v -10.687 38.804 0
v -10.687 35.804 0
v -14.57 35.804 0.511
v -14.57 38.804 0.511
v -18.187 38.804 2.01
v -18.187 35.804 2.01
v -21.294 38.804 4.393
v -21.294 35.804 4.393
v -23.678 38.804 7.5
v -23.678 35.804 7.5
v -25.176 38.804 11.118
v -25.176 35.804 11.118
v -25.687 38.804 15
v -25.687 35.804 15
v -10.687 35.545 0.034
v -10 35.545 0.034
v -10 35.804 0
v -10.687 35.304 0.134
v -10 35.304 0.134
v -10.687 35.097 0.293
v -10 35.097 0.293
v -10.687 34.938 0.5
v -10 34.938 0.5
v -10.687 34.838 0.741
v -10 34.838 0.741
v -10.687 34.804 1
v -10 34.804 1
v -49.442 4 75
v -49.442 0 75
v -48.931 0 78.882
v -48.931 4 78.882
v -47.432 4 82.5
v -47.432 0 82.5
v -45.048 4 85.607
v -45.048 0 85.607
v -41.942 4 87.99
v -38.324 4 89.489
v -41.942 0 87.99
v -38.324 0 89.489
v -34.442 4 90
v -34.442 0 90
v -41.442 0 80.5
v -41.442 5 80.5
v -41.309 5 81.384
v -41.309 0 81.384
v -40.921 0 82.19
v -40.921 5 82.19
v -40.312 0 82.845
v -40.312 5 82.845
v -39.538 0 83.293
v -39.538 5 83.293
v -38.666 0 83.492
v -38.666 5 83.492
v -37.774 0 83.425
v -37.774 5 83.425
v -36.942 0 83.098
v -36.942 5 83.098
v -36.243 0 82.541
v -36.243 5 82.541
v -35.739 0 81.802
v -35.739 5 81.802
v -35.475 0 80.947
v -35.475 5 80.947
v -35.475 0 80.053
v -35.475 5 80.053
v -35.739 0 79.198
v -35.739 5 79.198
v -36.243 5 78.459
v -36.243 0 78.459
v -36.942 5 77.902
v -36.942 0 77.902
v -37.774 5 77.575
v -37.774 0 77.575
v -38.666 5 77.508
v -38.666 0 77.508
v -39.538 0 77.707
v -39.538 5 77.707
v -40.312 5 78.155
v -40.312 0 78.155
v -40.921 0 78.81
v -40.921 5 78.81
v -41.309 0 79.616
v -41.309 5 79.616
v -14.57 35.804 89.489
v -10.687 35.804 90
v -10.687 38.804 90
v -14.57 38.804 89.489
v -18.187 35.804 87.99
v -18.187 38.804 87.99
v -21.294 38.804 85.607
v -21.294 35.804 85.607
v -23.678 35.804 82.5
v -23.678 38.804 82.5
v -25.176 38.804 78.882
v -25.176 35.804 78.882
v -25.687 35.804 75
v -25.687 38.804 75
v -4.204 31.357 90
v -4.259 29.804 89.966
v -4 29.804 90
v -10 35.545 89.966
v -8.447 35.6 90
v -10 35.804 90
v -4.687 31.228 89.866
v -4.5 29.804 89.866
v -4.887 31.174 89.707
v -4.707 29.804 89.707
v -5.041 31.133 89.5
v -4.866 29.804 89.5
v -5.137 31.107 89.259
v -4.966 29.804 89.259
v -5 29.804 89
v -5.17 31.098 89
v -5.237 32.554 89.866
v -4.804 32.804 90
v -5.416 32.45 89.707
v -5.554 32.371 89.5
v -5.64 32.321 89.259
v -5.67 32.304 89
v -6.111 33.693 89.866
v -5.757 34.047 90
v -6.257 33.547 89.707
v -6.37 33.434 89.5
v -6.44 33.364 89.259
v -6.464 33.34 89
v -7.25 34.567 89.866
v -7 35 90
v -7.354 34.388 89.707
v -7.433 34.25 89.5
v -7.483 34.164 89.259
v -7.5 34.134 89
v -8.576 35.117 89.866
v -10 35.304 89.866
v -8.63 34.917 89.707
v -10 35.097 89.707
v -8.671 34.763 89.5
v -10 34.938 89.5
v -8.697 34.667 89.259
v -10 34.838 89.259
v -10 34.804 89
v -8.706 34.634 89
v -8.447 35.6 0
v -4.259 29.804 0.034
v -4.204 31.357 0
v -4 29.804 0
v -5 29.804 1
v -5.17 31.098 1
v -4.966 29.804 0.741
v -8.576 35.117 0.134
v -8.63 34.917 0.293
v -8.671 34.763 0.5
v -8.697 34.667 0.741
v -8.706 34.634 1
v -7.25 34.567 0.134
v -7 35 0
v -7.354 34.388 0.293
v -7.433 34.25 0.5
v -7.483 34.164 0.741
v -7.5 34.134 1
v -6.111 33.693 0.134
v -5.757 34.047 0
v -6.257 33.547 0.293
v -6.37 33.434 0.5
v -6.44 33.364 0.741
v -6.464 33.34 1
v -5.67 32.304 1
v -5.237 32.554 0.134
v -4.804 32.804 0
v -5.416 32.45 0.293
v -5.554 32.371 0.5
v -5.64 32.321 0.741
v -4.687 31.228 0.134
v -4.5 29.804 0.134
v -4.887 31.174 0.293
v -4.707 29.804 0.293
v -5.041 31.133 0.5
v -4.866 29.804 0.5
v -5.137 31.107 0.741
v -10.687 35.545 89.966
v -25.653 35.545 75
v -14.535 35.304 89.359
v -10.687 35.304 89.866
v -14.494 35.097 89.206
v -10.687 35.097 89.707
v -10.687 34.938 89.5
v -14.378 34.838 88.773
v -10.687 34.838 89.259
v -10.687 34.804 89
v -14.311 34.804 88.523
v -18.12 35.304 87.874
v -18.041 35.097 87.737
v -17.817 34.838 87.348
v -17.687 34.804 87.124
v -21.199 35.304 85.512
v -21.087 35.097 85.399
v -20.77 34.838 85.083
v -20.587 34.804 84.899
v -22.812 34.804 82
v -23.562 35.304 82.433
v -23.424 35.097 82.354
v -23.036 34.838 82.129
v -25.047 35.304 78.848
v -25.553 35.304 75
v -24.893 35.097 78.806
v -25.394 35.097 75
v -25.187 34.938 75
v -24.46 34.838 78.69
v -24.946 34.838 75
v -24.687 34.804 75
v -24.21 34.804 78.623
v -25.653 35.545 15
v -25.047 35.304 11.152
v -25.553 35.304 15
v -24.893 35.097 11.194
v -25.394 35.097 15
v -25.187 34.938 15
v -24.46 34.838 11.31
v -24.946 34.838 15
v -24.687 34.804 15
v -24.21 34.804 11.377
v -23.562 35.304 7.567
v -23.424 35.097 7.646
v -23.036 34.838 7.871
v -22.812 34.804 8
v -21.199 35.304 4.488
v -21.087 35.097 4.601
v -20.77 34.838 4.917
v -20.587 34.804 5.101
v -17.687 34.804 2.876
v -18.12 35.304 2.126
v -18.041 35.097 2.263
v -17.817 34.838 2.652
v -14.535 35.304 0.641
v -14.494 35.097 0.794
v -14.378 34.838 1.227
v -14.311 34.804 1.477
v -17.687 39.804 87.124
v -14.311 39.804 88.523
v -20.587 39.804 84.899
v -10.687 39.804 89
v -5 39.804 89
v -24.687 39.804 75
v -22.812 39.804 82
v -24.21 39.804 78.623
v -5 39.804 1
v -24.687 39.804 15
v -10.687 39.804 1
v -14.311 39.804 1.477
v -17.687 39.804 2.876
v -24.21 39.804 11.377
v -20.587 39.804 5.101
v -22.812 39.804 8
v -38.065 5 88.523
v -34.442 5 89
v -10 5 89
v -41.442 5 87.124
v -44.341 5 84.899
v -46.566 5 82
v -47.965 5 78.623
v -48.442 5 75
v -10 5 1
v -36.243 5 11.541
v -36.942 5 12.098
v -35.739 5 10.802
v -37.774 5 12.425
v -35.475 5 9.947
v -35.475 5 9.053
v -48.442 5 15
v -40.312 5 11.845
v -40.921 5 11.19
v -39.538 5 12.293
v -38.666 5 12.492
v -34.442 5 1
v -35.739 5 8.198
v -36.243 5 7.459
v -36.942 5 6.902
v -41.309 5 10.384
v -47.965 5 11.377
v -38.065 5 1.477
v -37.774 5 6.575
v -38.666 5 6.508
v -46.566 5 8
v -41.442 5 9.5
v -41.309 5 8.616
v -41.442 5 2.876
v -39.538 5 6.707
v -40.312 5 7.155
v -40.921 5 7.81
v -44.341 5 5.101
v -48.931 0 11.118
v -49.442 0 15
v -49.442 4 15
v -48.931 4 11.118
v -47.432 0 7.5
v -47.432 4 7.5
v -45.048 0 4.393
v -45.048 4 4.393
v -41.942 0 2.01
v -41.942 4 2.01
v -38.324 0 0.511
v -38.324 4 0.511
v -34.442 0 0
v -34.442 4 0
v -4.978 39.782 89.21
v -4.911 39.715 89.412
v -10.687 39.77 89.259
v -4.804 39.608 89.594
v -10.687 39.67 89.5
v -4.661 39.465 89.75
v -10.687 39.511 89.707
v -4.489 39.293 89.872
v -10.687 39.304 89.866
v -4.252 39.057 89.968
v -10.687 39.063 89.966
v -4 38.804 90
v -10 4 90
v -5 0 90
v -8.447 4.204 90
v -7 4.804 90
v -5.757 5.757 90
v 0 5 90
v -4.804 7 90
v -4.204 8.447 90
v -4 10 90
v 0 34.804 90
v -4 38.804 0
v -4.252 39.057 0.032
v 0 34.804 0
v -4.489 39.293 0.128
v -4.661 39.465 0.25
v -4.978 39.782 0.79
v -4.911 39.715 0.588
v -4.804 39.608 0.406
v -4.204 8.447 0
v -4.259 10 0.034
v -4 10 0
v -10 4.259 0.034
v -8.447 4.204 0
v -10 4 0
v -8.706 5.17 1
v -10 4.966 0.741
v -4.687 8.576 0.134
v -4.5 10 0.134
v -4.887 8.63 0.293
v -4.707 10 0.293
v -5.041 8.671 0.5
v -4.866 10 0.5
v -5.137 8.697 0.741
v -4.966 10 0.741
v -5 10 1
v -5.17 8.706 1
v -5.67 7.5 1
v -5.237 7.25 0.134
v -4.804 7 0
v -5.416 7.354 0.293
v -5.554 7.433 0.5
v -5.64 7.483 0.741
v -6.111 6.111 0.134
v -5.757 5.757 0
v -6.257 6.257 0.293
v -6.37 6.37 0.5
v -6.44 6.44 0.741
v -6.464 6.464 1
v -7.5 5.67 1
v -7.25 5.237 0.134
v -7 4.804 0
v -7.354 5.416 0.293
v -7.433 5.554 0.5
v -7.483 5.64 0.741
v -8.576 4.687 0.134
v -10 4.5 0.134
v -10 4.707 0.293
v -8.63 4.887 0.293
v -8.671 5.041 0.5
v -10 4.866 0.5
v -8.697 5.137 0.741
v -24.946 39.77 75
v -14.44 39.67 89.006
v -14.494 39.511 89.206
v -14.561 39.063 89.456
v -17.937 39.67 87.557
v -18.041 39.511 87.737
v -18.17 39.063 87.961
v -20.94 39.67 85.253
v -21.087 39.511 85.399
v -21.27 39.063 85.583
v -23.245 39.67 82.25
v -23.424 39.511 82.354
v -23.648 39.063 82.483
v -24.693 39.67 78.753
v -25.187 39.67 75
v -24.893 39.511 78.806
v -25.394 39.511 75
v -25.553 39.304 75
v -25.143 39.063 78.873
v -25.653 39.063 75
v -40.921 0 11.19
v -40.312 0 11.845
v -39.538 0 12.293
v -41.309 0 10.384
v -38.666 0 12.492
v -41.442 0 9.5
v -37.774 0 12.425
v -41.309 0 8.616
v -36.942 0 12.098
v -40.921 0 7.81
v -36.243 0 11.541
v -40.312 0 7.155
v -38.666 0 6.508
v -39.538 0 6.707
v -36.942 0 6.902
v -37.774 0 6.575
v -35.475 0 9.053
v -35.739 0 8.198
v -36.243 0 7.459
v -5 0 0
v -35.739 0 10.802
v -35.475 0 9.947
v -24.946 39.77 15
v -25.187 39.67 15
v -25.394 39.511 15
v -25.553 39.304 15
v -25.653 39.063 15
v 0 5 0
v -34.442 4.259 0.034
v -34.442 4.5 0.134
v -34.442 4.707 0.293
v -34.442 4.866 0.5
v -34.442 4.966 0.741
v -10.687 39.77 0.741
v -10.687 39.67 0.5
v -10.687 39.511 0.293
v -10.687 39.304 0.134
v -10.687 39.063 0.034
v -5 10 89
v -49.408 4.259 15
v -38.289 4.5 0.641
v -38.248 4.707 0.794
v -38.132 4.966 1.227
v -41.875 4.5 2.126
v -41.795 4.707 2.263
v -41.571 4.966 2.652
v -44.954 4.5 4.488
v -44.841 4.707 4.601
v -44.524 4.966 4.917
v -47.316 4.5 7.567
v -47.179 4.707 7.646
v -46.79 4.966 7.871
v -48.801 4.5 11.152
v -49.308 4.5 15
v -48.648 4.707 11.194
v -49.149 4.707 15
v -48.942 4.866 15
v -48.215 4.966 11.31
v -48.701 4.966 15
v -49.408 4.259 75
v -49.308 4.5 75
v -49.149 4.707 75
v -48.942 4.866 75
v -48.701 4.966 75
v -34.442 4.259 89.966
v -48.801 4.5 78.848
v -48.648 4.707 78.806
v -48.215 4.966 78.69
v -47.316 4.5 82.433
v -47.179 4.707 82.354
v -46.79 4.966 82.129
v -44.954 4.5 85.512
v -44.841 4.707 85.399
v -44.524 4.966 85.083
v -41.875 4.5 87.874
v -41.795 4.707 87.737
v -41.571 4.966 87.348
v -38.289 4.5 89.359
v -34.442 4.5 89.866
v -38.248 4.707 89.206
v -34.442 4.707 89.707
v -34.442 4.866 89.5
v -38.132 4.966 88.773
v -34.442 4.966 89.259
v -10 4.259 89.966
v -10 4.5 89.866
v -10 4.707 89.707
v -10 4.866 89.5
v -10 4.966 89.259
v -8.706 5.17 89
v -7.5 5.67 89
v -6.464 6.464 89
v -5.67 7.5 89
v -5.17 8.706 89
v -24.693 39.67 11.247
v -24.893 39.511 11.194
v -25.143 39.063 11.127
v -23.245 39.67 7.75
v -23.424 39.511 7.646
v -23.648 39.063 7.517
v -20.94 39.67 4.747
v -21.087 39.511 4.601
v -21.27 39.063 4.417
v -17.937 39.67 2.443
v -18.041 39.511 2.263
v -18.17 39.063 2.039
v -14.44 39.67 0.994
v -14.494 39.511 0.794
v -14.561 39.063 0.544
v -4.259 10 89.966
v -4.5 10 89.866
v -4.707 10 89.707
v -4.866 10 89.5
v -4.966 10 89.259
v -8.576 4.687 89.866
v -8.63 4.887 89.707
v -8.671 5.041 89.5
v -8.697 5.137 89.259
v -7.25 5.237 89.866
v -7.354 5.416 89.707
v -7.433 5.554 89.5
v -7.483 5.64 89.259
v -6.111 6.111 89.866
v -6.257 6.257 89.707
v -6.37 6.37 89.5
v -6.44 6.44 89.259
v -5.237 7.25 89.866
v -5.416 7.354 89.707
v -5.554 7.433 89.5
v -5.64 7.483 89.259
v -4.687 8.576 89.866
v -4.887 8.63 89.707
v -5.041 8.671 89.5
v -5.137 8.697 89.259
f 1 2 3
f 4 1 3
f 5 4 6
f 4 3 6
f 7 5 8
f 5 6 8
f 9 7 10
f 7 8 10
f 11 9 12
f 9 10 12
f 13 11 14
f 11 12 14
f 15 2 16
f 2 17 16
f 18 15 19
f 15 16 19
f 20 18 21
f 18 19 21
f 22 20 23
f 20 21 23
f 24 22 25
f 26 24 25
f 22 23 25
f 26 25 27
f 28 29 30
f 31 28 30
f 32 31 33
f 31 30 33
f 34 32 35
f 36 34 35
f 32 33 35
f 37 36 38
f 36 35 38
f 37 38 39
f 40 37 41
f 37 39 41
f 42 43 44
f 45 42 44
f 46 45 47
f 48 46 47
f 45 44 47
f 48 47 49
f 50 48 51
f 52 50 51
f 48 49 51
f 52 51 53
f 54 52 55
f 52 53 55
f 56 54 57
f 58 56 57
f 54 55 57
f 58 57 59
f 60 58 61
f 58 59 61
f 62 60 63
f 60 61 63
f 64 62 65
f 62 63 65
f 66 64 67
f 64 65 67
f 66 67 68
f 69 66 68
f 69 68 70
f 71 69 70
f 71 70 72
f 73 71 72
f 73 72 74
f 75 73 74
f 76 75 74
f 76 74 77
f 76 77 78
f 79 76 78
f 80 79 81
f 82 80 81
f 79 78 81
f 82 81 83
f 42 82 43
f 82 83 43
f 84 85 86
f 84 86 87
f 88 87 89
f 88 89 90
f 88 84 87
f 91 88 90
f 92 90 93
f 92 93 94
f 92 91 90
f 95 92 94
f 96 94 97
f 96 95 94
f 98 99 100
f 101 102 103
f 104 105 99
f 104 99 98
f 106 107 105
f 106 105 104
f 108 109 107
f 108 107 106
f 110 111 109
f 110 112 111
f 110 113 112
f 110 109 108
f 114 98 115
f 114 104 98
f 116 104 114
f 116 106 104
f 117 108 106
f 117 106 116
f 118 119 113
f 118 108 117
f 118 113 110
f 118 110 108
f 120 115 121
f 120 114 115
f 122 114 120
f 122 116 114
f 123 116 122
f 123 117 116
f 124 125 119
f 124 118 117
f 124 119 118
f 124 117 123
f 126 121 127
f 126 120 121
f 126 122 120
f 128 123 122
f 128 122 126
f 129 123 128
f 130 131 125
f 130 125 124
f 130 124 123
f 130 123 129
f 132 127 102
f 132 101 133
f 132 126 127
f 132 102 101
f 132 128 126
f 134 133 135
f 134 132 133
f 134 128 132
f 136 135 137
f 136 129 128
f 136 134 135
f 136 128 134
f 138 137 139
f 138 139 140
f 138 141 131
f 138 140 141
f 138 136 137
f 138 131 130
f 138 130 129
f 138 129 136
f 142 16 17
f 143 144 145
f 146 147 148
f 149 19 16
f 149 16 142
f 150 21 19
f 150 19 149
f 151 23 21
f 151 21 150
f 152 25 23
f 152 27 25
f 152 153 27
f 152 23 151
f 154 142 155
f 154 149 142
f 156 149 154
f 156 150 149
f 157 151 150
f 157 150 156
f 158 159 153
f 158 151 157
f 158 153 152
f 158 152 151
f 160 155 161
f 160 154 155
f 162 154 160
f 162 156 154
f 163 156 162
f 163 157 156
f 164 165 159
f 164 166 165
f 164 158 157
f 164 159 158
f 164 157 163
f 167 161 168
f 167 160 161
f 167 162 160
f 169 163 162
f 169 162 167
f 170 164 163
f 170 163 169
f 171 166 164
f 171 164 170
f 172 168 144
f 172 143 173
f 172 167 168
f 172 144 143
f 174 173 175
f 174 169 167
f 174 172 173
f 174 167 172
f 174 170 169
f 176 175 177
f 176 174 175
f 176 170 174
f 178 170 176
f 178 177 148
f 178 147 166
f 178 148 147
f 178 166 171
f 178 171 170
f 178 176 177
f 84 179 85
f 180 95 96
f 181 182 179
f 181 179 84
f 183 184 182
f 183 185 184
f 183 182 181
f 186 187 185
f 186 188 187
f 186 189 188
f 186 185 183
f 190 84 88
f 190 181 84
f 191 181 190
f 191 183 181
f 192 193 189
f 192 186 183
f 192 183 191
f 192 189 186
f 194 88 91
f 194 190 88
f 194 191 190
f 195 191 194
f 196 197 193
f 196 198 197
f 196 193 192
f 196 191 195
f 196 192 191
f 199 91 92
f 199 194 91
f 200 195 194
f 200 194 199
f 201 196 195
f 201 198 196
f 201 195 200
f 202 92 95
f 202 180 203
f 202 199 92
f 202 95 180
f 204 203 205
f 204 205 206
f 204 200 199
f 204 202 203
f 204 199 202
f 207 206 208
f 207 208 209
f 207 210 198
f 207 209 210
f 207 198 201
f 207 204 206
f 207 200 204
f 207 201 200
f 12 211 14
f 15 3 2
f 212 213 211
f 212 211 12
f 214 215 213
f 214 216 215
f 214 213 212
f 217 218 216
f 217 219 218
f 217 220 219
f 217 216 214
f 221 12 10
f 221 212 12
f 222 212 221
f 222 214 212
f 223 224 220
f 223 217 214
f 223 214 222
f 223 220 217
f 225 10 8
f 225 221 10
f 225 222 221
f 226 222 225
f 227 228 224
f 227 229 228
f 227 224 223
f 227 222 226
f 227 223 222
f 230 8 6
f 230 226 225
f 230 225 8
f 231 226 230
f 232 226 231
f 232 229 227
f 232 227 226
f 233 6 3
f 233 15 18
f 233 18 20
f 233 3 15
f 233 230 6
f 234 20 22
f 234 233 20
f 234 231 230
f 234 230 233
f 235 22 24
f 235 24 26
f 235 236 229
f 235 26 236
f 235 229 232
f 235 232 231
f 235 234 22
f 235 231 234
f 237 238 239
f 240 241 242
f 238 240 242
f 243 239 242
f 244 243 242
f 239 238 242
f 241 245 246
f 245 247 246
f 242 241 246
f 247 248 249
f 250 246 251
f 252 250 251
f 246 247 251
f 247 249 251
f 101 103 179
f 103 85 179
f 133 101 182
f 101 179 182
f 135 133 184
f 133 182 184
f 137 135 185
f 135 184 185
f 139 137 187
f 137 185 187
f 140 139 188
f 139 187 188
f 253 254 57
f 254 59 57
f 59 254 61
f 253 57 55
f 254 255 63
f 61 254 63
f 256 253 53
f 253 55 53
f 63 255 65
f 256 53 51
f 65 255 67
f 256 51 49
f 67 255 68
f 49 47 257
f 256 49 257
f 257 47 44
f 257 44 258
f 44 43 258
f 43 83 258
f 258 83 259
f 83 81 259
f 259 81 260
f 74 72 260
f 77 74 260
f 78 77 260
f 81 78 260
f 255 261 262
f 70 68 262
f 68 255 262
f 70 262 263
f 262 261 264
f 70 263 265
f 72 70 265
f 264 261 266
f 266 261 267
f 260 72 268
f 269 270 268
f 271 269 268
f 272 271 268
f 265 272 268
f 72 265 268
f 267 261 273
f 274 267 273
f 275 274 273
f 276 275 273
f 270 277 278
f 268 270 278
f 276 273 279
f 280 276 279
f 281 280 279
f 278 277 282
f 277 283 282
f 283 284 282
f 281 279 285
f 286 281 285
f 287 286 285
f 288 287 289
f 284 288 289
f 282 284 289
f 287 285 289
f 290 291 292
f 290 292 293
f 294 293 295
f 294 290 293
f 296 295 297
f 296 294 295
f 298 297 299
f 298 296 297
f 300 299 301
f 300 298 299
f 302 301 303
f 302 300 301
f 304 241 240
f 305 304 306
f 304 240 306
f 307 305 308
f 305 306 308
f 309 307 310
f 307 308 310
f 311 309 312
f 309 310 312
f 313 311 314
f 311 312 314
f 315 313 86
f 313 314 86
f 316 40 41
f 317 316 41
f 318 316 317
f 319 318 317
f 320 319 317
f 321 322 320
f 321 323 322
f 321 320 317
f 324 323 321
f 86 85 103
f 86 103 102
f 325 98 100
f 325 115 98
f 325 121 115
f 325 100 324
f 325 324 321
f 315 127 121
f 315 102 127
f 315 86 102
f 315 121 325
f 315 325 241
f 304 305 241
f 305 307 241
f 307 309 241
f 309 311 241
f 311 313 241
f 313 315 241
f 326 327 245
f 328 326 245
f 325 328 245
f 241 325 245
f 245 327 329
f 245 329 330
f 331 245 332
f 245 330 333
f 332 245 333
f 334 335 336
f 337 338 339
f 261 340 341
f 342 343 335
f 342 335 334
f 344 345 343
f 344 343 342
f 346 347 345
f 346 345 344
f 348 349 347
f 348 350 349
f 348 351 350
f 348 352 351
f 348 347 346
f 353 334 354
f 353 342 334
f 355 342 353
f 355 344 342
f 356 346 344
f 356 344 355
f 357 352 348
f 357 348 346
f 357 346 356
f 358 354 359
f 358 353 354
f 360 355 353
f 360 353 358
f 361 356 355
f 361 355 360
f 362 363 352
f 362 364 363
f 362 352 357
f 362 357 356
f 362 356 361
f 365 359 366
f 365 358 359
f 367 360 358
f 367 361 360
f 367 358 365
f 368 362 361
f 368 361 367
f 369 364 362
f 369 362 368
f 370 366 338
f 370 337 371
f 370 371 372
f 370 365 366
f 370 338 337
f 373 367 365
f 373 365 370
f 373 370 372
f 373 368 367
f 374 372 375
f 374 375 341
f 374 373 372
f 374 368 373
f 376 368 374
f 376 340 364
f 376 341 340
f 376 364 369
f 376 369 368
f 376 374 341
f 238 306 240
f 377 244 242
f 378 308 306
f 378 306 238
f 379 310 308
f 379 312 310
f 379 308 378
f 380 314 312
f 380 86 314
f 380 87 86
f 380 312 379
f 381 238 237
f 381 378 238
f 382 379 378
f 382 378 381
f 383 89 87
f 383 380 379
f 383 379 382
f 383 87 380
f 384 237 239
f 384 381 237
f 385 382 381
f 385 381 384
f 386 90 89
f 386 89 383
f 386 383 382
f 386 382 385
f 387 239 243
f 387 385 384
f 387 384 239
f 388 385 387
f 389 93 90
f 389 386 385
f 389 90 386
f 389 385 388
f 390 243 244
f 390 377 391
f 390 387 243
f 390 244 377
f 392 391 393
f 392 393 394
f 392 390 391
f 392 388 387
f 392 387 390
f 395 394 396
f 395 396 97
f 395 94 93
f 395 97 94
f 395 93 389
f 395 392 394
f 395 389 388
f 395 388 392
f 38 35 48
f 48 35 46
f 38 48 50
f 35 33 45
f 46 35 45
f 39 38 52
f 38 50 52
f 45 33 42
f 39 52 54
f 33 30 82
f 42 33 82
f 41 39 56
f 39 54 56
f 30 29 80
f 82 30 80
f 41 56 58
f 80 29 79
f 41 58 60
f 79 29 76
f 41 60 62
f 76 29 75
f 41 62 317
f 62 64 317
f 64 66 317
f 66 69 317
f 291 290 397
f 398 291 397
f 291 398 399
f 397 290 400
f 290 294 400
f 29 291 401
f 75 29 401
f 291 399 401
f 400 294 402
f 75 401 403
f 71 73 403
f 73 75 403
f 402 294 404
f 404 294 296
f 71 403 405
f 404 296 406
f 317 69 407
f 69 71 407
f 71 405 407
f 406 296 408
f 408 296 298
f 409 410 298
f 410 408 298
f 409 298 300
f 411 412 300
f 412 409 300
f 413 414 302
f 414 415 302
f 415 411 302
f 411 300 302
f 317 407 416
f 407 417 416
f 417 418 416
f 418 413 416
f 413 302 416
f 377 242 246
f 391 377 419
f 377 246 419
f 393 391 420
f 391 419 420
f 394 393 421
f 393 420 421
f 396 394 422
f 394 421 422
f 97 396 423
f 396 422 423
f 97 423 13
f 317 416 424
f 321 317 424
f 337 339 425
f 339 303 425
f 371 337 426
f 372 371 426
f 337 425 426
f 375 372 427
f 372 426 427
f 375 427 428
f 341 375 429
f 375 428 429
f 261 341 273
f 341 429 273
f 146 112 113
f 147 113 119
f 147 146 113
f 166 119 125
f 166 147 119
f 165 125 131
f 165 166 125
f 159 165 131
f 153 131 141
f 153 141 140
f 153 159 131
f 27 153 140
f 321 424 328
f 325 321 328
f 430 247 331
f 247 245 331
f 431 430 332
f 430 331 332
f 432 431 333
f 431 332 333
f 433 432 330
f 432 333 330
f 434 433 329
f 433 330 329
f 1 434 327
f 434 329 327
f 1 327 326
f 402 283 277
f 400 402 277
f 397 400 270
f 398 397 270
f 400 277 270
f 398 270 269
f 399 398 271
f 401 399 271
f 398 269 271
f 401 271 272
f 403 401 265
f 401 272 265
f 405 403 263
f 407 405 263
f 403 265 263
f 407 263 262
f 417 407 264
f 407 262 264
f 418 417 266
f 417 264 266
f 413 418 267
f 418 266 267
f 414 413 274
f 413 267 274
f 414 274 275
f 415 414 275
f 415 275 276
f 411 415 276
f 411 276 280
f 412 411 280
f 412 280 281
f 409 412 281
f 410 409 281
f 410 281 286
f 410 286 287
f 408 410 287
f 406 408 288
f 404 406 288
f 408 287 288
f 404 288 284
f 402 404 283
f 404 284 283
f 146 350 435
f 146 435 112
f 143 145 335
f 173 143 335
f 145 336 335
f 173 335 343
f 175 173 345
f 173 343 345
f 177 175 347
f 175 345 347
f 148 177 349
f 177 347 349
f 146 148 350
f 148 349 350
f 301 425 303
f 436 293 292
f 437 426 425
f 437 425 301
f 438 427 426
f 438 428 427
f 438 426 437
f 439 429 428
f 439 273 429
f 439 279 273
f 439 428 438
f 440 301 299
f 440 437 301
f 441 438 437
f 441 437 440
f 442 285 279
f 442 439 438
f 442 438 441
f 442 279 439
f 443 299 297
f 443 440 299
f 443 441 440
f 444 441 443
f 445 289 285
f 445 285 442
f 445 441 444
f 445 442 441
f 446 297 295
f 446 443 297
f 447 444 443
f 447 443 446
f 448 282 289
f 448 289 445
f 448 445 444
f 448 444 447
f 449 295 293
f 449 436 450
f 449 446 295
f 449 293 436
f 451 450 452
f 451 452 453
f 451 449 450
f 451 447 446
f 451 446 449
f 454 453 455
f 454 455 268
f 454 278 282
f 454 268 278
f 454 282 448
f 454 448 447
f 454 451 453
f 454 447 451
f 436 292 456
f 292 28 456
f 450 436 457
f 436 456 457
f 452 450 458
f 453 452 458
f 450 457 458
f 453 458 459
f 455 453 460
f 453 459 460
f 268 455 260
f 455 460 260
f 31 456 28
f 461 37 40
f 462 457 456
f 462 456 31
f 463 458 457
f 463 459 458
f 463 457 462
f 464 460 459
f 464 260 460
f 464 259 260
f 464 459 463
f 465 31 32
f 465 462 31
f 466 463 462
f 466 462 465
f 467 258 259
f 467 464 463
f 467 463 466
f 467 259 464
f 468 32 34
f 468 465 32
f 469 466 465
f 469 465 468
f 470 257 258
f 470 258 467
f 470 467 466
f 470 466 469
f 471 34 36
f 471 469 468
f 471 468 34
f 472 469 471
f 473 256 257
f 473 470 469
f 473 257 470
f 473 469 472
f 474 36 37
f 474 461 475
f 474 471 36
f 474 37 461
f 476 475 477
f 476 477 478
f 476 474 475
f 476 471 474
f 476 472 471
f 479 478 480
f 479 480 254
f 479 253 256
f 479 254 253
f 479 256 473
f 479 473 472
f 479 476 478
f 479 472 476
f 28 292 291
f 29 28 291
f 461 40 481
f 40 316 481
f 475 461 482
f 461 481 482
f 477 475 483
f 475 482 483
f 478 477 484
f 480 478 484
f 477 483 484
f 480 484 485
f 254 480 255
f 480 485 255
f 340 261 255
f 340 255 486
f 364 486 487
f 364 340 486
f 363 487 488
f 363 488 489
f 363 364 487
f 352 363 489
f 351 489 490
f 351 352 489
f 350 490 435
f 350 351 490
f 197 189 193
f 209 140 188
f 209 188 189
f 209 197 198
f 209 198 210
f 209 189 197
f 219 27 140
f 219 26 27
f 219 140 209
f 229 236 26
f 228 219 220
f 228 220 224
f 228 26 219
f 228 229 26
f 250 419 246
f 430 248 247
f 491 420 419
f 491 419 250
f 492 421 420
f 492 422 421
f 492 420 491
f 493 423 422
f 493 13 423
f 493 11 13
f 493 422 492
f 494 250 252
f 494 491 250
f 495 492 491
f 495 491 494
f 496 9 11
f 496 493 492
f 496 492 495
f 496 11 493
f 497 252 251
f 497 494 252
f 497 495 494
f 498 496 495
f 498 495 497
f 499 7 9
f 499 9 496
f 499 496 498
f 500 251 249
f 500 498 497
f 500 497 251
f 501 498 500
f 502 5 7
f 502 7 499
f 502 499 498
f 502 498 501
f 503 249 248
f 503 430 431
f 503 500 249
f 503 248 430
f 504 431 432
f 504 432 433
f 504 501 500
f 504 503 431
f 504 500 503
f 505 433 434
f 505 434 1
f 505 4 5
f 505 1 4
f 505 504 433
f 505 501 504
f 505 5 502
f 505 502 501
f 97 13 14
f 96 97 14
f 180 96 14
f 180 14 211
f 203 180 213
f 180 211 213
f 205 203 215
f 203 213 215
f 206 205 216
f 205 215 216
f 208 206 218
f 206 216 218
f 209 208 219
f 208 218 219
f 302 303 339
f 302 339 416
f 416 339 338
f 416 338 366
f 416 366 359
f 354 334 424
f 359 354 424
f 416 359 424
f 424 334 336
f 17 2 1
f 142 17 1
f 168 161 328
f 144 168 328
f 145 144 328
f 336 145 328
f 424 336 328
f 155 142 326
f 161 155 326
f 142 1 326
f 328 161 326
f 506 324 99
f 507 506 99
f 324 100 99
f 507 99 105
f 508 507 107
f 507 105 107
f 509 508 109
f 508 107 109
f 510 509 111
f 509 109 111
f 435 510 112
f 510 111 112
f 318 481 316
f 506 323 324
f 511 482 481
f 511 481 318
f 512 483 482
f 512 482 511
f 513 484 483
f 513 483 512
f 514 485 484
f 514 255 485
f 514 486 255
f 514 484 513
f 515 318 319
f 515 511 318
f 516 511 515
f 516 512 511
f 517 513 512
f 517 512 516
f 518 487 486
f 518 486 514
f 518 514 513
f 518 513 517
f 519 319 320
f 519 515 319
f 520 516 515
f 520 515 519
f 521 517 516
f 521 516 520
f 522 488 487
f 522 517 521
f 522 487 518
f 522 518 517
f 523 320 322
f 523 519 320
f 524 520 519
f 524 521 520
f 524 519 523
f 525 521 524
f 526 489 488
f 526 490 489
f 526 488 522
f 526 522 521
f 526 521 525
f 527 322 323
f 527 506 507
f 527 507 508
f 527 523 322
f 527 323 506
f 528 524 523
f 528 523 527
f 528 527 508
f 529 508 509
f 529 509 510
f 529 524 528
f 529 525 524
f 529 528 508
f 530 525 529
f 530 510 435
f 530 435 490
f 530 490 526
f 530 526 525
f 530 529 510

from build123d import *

# Parameters (mm, degrees)
PAD_DEPTH    = 90
SKETCH001_R  = 3
POCKET_DEPTH = 5
FILLET_R     = 15
FILLET001_R  = 1
FILLET002_R  = 1


with BuildPart() as part:
    # Sketch (on XY_Plane of Origin) → Pad (new body)
    with BuildSketch(Plane.XY):
        with BuildLine():
            Line((-49.441831, 0), (-5, 0))
            Line((-5, 0), (0, 5))
            Line((0, 5), (0, 8.139563))
            Line((0, 8.139563), (0, 34.804017))
            Line((0, 34.804017), (-5, 39.804017))
            Line((-5, 39.804017), (-25.687218, 39.804017))
            Line((-25.687218, 39.804017), (-25.687218, 34.804017))
            Line((-10, 34.804017), (-25.687218, 34.804017))
            ThreePointArc((-5, 29.804017), (-6.464466, 33.339551), (-10, 34.804017))
            Line((-5, 10), (-5, 29.804017))
            ThreePointArc((-10, 5), (-6.464466, 6.464466), (-5, 10))
            Line((-20, 5), (-10, 5))
            Line((-20, 5), (-49.441831, 5))
            Line((-49.441831, 5), (-49.441831, 0))
        make_face()
    extrude(amount=PAD_DEPTH)

    # Sketch001 → Pocket (cut)
    with BuildSketch(Plane(origin=(0, 5, 0), x_dir=(-1, 0, 0), z_dir=(0, 1, 0))):
        with Locations((38.441831, 80.5)):
            Circle(SKETCH001_R)
        with Locations((38.441831, 9.5)):
            Circle(SKETCH001_R)
    extrude(amount=-POCKET_DEPTH, mode=Mode.SUBTRACT)

    # Fillet
    fillet_edges = [part.edges().sort_by_distance(p)[0] for p in [
        (-25.687218, 37.304017, 90),
        (-25.687218, 37.304017, 0),
        (-49.441831, 2.5, 0),
        (-49.441831, 2.5, 90),
    ]]
    fillet(fillet_edges, radius=FILLET_R)

    # Fillet001
    fillet001_edges = [part.edges().sort_by_distance(p)[0] for p in [
        (-49.441831, 5, 45),
        (-45.048433, 5, 85.606602),
        (-22.220916, 5, 90),
        (-45.048433, 5, 4.393398),
        (-22.220916, 5, 0),
    ]]
    fillet(fillet001_edges, radius=FILLET001_R)

    # Fillet002
    fillet002_edges = [part.edges().sort_by_distance(p)[0] for p in [
        (-21.29382, 39.804017, 85.606602),
        (-25.687218, 39.804017, 45),
        (-21.29382, 39.804017, 4.393398),
    ]]
    fillet(fillet002_edges, radius=FILLET002_R)


solid = part.part
